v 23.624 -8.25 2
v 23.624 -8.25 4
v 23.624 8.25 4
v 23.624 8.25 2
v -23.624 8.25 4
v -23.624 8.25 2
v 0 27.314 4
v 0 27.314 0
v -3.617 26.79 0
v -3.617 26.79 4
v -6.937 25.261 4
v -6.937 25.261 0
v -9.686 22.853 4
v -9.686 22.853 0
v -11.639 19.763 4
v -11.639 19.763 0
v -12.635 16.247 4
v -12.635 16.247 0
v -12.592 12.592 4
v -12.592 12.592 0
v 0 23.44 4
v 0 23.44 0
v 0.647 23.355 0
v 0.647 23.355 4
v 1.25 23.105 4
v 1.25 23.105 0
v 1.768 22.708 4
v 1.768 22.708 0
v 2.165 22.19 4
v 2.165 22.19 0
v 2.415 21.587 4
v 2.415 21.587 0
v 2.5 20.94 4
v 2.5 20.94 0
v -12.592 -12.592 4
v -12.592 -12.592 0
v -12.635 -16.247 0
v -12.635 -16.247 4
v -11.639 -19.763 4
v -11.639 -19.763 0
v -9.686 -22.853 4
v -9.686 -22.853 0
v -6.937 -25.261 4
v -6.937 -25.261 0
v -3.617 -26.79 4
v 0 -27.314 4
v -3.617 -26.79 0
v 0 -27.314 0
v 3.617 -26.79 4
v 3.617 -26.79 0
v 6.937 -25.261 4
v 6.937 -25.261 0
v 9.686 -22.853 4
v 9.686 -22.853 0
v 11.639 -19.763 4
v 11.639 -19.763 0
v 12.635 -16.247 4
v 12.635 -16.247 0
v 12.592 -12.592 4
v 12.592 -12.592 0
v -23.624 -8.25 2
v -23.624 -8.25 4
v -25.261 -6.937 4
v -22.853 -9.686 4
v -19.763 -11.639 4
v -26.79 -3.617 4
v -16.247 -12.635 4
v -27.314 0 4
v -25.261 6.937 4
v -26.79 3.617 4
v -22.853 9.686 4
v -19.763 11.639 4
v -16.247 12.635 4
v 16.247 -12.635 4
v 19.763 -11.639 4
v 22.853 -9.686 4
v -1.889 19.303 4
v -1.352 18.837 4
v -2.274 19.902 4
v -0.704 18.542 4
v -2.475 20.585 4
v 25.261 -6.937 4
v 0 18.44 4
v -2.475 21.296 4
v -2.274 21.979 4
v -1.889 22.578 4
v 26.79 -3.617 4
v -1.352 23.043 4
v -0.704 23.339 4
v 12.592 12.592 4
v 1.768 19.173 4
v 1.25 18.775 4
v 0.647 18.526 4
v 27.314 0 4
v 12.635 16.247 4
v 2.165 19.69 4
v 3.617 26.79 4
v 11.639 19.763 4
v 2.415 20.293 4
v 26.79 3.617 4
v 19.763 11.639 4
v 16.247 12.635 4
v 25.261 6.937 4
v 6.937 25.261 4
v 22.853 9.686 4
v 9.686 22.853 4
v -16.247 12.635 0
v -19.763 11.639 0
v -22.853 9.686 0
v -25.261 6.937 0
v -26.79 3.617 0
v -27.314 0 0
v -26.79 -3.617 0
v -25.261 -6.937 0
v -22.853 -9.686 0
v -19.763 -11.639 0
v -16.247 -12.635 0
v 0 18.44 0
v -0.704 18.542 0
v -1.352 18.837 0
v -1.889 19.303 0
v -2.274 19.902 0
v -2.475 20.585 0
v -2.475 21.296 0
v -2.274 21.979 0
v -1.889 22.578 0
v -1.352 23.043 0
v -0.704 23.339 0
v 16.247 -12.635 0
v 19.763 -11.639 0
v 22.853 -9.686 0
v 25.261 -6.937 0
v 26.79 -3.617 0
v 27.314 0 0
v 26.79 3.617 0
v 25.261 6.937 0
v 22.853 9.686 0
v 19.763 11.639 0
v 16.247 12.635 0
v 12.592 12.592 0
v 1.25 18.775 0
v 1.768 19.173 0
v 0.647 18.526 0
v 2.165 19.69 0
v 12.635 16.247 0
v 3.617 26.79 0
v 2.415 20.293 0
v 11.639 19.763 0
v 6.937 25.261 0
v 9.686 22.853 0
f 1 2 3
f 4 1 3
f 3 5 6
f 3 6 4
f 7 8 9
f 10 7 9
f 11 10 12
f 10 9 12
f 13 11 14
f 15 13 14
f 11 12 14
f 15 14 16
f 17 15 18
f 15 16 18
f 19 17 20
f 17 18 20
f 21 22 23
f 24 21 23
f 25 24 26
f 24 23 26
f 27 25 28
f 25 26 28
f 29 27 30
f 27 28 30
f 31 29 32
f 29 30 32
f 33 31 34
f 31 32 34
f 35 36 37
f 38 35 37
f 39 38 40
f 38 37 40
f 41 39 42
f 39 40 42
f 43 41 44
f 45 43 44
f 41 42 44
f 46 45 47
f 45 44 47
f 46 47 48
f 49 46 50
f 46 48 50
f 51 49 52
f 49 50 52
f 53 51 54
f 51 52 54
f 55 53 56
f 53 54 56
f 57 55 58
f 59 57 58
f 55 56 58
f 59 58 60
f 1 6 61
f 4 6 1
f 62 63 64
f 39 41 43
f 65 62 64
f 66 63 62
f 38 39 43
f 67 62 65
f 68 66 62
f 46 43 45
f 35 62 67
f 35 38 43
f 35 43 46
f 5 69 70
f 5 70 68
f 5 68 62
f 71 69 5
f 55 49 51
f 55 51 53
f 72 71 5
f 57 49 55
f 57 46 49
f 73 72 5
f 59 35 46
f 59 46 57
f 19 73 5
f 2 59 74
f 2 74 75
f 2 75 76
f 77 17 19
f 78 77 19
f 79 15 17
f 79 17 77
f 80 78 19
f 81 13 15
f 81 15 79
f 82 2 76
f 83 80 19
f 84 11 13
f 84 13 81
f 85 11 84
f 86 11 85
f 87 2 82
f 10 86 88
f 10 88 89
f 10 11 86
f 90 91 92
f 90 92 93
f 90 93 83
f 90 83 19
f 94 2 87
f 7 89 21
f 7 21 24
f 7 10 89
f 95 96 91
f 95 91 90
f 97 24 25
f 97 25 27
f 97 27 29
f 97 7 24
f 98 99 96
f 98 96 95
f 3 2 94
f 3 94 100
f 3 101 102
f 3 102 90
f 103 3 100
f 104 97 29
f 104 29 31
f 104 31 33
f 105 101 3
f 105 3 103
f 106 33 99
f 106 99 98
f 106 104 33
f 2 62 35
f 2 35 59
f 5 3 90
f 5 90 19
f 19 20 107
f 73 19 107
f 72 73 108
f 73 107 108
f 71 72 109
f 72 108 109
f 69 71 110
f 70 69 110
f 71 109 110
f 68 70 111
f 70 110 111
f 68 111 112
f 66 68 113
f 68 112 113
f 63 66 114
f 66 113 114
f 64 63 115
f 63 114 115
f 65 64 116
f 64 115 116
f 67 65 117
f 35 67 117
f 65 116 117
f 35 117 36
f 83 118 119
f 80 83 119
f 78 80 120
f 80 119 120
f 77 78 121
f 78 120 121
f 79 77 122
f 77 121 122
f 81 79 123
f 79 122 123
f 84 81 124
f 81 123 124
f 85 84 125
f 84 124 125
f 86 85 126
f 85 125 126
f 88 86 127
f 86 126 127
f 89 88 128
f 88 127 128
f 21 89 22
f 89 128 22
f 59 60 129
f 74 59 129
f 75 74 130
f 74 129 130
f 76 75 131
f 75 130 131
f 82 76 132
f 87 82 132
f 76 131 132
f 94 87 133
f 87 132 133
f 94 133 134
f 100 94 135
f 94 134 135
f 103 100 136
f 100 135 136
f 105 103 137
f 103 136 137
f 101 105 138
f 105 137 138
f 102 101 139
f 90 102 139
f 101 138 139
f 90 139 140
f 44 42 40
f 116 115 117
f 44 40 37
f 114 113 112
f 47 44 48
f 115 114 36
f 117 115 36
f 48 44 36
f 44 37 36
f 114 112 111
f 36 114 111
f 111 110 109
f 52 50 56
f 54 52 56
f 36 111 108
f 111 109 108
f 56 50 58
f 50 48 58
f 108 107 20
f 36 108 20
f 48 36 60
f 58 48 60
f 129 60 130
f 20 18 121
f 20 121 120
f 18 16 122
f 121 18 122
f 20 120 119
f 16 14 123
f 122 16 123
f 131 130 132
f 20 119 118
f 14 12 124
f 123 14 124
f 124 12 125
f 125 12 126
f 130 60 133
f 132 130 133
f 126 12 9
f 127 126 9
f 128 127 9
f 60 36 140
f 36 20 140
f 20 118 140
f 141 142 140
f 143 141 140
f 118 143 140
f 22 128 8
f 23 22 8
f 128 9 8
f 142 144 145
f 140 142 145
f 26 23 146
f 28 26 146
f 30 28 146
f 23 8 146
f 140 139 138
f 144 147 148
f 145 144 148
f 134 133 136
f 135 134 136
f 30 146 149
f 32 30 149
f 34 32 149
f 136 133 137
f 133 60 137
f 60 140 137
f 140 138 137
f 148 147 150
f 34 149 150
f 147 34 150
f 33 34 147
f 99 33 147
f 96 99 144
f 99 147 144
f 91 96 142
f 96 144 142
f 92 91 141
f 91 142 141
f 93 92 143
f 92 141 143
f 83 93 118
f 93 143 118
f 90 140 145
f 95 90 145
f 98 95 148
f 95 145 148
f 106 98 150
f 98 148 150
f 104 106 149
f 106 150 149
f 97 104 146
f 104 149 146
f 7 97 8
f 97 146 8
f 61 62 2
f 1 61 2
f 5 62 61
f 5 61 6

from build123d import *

# Parameters (mm, degrees)
F1_DEPTH = 4
F2_W     = 47.247536
F2_H     = 16.5
F3_DEPTH = 2


with BuildPart() as f1:
    # F0 (on Top) → F1 (new body)
    with BuildSketch(Plane.XY):
        with BuildLine():
            ThreePointArc((0, 27.313505), (-9.686066, 22.852633), (-12.592393, 12.592393))
            ThreePointArc((-12.592393, 12.592393), (-27.313505, 0), (-12.592393, -12.592393))
            ThreePointArc((-12.592393, -12.592393), (0, -27.313505), (12.592393, -12.592393))
            ThreePointArc((12.592393, -12.592393), (27.313505, 0), (12.592393, 12.592393))
            ThreePointArc((12.592393, 12.592393), (9.686066, 22.852633), (0, 27.313505))
        make_face()
        with BuildLine():
            ThreePointArc((0, 18.440354), (-2.5, 20.940354), (0, 23.440354))
            ThreePointArc((0, 23.440354), (1.767767, 22.708121), (2.5, 20.940354))
            ThreePointArc((2.5, 20.940354), (1.767767, 19.172587), (0, 18.440354))
        make_face(mode=Mode.SUBTRACT)
    extrude(amount=F1_DEPTH)

    # F2 (on face) → F3 (cut)
    with BuildSketch(Plane.XY.offset(4)):
        Rectangle(F2_W, F2_H)
    extrude(amount=-F3_DEPTH, mode=Mode.SUBTRACT)


solid = f1.part
